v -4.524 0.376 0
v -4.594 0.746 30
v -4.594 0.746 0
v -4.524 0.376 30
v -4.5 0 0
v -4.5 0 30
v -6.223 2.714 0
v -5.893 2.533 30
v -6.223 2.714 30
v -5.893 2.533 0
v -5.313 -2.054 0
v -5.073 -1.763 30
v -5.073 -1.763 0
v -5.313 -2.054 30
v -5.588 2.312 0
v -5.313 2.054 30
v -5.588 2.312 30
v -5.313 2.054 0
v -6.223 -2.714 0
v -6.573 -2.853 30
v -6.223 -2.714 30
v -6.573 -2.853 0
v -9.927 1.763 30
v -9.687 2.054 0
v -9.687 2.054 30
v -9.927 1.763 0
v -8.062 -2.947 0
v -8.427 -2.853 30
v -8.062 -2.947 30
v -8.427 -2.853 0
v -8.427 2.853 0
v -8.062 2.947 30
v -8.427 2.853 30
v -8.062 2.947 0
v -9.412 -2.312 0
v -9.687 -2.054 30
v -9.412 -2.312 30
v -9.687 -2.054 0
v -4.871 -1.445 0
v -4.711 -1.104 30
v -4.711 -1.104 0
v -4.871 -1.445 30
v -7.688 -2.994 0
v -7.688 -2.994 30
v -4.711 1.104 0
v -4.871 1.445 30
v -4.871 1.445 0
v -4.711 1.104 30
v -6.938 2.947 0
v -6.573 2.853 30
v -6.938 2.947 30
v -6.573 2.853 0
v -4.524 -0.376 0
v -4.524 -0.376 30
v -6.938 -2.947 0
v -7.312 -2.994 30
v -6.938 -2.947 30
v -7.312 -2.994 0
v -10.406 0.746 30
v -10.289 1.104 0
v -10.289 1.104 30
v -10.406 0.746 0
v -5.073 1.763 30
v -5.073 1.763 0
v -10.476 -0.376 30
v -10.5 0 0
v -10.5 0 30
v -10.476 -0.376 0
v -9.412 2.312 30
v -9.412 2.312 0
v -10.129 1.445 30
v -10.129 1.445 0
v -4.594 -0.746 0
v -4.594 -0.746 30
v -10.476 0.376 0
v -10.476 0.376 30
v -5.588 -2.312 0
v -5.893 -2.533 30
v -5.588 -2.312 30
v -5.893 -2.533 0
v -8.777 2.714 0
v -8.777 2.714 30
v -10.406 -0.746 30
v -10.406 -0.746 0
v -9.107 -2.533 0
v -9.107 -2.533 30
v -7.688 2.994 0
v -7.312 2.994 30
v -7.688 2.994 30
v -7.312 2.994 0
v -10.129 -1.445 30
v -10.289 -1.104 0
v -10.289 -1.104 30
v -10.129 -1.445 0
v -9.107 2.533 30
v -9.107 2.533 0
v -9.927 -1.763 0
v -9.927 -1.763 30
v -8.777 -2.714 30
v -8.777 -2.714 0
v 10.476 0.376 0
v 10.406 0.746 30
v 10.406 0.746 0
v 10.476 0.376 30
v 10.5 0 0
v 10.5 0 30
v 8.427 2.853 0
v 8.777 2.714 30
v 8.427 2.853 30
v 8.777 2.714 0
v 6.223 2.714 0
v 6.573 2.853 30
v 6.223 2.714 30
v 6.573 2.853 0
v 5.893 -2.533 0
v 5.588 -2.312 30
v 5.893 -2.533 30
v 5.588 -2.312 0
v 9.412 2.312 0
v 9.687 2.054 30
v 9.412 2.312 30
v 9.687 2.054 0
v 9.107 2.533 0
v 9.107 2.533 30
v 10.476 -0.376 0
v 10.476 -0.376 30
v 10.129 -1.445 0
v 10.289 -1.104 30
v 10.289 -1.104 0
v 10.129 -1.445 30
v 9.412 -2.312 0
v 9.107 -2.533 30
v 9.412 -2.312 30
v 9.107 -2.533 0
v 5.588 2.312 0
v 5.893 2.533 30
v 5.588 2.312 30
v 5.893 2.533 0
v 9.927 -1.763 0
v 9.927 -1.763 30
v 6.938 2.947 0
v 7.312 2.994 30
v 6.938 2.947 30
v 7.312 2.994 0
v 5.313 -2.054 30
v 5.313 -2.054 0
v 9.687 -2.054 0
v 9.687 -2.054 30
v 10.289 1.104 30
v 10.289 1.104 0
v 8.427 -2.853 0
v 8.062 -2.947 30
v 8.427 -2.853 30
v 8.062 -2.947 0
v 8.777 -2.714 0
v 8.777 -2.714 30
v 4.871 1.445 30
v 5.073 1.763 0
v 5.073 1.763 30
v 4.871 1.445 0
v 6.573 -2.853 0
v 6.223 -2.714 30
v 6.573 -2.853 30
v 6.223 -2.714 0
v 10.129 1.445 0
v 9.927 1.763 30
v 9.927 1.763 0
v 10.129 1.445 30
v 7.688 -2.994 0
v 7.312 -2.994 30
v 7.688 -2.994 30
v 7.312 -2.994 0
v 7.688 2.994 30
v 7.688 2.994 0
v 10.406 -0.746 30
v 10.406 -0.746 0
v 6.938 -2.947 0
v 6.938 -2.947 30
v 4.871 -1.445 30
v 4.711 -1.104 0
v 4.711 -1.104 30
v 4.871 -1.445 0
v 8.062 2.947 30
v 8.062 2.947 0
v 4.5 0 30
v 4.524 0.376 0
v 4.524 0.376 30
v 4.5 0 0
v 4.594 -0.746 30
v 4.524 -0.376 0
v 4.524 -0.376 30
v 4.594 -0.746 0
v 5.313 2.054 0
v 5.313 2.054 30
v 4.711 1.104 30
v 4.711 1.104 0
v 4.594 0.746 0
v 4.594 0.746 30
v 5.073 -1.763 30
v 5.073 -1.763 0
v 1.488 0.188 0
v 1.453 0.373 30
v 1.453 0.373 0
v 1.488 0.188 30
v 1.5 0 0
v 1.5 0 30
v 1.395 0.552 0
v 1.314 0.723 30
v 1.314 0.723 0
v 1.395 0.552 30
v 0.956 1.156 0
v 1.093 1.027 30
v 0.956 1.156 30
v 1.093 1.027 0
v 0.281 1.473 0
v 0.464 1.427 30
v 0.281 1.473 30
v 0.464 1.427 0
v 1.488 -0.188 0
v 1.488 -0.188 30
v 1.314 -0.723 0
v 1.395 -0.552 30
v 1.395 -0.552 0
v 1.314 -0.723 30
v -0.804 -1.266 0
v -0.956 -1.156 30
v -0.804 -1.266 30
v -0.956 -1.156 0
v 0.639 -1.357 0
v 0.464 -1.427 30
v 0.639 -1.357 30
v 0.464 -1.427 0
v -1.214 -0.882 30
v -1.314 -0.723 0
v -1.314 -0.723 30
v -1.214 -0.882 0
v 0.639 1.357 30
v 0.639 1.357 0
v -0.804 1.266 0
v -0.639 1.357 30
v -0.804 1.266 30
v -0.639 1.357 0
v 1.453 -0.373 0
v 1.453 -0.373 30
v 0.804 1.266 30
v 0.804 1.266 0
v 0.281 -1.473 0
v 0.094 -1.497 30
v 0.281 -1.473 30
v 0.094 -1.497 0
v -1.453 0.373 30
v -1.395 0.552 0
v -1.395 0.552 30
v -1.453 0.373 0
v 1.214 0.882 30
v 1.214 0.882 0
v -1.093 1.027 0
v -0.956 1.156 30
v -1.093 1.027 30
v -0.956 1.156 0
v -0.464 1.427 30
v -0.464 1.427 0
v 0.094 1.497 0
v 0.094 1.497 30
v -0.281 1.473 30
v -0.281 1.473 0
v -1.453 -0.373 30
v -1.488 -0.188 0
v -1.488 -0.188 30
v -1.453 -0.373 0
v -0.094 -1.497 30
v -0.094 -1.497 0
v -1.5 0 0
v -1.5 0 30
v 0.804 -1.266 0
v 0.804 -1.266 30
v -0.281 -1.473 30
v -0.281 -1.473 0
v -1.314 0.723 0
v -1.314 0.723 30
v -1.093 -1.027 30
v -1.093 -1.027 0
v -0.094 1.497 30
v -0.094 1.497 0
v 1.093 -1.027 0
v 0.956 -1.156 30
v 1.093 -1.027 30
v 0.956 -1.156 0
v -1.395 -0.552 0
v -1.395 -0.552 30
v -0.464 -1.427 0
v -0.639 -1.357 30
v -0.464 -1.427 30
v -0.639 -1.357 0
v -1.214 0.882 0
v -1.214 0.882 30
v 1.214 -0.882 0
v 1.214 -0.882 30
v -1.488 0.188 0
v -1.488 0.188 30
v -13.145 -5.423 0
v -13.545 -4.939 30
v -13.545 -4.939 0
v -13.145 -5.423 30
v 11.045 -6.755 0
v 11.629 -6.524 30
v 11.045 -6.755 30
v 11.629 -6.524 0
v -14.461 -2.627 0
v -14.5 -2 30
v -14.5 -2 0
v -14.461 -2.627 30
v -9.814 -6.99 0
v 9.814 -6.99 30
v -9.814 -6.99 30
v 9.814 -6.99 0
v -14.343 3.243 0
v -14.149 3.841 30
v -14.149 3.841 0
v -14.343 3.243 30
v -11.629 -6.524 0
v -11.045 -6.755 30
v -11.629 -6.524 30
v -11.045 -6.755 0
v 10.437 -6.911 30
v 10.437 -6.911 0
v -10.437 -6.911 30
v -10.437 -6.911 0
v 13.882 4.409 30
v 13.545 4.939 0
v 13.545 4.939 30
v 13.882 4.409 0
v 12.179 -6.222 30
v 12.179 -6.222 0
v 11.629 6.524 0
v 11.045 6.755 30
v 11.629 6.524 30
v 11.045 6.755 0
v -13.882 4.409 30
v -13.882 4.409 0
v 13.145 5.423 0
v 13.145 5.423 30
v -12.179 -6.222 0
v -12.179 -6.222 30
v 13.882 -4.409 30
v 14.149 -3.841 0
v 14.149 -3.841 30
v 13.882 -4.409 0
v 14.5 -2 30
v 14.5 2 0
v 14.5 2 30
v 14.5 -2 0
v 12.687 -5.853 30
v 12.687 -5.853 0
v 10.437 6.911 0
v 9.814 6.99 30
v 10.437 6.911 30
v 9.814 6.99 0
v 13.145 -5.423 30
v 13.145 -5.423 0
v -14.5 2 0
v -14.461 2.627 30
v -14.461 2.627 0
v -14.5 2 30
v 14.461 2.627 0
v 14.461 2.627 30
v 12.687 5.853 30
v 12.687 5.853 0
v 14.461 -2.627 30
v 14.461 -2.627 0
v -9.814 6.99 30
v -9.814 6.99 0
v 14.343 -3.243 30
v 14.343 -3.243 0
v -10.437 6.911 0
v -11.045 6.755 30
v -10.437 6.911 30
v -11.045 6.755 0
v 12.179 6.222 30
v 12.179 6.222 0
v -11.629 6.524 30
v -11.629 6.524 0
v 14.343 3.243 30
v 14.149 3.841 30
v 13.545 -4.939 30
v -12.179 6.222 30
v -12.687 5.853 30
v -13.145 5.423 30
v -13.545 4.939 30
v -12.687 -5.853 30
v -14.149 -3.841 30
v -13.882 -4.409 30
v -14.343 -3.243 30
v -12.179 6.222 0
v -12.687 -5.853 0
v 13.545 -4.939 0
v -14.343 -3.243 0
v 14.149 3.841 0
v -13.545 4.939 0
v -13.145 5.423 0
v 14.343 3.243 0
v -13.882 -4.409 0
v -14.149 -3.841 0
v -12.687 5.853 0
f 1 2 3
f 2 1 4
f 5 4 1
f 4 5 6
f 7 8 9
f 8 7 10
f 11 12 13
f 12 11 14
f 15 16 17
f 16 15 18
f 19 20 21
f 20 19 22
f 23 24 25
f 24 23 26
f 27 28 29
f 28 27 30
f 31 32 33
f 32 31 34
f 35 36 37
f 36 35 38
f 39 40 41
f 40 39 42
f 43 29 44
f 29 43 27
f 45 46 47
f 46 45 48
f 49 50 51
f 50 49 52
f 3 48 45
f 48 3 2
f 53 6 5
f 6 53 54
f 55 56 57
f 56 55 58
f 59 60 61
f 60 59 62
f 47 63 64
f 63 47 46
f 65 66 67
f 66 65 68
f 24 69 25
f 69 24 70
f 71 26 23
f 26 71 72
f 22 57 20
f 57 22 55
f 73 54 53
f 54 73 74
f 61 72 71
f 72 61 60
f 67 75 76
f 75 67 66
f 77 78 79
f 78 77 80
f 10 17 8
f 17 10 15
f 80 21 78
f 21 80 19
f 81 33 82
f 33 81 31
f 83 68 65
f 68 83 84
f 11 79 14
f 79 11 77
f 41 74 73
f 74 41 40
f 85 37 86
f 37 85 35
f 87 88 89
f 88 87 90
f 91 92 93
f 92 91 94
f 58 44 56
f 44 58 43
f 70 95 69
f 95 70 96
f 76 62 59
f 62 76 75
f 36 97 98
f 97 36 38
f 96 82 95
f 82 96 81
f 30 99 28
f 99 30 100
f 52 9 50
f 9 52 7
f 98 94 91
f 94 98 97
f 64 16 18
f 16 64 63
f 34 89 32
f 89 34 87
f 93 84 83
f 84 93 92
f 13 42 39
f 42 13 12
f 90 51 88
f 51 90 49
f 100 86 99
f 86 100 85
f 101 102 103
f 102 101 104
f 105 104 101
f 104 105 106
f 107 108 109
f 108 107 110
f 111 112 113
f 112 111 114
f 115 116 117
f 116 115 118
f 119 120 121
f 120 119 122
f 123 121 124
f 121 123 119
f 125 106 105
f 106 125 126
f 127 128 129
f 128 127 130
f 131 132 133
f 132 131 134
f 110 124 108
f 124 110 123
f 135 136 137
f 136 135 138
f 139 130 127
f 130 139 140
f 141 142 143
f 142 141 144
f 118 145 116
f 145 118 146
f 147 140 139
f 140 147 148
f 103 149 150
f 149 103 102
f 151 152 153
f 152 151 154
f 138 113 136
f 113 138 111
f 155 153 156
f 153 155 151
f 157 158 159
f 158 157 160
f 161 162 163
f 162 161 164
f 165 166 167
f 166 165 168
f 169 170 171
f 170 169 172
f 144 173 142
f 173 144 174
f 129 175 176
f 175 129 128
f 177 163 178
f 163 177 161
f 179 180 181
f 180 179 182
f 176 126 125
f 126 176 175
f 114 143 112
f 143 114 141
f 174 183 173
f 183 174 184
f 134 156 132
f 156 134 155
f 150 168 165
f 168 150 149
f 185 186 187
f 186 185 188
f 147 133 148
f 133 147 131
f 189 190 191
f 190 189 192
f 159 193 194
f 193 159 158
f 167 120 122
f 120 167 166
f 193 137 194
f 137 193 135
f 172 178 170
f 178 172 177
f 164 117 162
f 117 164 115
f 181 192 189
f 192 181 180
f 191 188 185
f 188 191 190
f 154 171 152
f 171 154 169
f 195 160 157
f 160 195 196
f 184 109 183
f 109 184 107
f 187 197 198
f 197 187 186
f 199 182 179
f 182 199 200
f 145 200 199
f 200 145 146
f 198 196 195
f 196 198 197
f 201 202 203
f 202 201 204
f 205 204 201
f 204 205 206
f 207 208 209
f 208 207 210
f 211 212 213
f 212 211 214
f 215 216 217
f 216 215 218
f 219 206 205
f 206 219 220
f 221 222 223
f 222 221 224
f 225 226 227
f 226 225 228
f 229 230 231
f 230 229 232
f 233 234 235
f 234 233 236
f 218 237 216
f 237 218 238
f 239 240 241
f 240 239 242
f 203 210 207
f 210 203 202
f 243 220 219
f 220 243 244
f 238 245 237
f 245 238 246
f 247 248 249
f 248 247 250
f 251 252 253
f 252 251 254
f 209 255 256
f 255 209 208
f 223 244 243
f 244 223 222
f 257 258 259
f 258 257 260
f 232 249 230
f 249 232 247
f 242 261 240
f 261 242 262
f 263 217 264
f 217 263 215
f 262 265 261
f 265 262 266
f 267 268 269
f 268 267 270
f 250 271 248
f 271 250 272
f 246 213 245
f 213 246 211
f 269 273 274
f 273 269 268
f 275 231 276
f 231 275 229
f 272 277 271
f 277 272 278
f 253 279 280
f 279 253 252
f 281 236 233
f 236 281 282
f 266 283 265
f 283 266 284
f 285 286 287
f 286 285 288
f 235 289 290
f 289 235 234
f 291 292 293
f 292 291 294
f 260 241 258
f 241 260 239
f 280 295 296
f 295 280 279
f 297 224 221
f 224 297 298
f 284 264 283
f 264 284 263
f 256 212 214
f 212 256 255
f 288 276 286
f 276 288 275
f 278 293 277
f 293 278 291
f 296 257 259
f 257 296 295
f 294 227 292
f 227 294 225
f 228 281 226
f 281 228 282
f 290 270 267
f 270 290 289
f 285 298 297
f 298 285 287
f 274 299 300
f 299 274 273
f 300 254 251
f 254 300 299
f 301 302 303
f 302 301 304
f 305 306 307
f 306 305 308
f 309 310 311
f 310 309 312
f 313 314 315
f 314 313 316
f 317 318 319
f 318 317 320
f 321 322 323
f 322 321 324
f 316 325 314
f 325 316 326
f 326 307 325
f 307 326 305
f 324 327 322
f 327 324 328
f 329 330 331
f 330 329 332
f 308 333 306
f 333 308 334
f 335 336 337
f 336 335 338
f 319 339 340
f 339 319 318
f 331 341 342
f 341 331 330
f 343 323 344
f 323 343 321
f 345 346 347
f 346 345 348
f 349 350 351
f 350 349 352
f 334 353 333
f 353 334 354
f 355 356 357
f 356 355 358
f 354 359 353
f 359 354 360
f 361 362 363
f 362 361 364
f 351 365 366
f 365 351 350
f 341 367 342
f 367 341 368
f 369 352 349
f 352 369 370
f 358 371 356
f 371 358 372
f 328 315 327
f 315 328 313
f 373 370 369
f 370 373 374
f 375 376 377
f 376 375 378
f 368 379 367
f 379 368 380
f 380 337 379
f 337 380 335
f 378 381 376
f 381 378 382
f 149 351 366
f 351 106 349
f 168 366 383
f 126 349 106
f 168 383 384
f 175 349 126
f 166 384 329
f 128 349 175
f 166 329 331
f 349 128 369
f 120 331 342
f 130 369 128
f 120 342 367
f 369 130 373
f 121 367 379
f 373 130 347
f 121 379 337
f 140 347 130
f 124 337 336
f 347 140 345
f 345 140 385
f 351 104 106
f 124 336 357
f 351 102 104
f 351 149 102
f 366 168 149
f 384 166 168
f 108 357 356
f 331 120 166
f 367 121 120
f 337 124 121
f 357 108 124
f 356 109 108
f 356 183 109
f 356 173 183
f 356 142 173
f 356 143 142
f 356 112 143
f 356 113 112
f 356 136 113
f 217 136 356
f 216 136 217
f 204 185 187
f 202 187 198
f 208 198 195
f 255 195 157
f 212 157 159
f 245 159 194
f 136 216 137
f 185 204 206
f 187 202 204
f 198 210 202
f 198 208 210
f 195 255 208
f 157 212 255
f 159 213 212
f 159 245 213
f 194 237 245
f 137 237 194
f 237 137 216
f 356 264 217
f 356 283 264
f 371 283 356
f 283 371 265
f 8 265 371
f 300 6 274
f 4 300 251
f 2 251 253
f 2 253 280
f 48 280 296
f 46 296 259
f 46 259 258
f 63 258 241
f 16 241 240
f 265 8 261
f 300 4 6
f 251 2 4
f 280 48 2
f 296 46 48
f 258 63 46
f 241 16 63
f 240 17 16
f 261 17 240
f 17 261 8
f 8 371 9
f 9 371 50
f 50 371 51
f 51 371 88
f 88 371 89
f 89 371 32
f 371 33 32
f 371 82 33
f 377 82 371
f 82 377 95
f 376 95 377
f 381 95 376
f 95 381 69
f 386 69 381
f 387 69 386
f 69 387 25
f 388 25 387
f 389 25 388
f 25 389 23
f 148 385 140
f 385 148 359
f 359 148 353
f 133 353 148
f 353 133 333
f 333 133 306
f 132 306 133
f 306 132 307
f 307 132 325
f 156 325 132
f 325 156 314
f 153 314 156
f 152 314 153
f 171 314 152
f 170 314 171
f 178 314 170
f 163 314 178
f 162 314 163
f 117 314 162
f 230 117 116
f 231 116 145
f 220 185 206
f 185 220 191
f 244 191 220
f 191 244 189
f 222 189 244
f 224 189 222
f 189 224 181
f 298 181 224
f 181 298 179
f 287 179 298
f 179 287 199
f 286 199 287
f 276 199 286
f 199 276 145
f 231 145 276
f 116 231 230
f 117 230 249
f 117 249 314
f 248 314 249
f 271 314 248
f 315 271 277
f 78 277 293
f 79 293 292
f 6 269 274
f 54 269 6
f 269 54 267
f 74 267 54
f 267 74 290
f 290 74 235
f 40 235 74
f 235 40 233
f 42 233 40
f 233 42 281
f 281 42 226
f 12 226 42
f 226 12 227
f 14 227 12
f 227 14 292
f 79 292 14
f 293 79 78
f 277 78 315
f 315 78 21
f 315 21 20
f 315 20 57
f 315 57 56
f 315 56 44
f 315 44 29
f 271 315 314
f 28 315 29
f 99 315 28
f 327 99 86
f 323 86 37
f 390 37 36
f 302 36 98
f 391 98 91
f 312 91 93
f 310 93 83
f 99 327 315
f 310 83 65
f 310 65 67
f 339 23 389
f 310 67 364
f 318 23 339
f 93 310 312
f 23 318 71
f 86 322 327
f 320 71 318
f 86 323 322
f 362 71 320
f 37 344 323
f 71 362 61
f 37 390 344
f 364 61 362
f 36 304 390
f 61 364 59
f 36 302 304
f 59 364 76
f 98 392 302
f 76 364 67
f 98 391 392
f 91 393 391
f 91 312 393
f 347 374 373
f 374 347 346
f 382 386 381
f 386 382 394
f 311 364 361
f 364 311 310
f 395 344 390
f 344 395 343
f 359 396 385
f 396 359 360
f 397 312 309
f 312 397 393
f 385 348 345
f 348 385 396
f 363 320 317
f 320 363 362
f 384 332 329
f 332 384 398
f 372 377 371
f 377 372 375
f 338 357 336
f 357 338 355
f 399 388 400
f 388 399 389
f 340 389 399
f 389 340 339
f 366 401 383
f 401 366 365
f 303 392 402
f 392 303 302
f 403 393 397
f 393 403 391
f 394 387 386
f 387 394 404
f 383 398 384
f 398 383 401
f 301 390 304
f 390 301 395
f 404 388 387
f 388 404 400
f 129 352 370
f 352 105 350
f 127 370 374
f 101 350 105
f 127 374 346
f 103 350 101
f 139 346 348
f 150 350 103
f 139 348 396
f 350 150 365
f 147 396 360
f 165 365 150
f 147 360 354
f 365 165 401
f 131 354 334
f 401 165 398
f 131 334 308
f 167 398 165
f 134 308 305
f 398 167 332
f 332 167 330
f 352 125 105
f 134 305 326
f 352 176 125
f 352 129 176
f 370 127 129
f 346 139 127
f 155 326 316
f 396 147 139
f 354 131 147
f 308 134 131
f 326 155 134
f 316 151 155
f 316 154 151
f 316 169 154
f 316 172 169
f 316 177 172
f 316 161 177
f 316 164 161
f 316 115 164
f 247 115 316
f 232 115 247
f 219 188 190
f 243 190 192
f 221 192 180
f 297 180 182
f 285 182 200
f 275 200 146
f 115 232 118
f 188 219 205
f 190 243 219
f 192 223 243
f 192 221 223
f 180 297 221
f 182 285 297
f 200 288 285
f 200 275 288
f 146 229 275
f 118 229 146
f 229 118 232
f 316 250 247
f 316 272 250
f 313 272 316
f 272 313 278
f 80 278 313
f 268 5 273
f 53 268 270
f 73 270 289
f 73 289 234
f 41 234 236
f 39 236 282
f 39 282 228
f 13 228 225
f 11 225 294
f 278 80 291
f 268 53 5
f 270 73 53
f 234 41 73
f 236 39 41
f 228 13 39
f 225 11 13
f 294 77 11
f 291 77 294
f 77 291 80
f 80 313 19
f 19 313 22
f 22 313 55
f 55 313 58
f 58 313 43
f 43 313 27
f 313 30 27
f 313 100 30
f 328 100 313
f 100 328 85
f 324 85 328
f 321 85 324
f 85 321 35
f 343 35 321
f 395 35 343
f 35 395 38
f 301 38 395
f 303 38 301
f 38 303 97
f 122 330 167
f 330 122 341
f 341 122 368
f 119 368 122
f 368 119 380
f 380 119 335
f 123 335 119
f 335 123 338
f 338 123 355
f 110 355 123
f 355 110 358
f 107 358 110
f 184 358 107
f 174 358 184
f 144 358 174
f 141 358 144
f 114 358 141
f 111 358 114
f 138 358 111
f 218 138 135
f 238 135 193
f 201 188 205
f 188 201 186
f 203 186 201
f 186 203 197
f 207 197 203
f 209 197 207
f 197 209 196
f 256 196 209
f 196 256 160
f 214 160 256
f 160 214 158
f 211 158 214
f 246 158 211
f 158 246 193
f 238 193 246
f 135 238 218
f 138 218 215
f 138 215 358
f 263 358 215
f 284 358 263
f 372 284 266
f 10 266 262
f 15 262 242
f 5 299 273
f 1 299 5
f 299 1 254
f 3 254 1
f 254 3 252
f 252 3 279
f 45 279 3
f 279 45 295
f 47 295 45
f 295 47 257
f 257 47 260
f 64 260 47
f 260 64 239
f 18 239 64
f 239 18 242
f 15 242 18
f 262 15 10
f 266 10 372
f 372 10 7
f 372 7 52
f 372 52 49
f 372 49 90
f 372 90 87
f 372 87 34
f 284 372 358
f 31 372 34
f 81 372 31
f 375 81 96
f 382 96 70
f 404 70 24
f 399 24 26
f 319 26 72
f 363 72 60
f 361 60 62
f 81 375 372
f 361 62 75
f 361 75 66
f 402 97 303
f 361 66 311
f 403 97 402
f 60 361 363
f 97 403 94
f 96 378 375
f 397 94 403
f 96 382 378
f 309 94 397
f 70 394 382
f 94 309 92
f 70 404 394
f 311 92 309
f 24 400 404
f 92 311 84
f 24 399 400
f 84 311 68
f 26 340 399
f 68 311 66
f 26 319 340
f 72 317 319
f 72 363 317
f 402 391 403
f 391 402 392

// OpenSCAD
$fn = 50;


difference() {
	union() {
		translate(v = [0, 0, 0]) {
			rotate(a = [0, 0, 0]) {
				hull() {
					translate(v = [-9.5000000000, 2.0000000000, 0]) {
						rotate(a = [0, 0, 0]) {
							translate(v = [0, 0, 0]) {
								rotate(a = [0, 0, 0]) {
									cylinder(h = 30, r = 5);
								}
							}
						}
					}
					translate(v = [9.5000000000, 2.0000000000, 0]) {
						rotate(a = [0, 0, 0]) {
							translate(v = [0, 0, 0]) {
								rotate(a = [0, 0, 0]) {
									cylinder(h = 30, r = 5);
								}
							}
						}
					}
					translate(v = [-9.5000000000, -2.0000000000, 0]) {
						rotate(a = [0, 0, 0]) {
							translate(v = [0, 0, 0]) {
								rotate(a = [0, 0, 0]) {
									cylinder(h = 30, r = 5);
								}
							}
						}
					}
					translate(v = [9.5000000000, -2.0000000000, 0]) {
						rotate(a = [0, 0, 0]) {
							translate(v = [0, 0, 0]) {
								rotate(a = [0, 0, 0]) {
									cylinder(h = 30, r = 5);
								}
							}
						}
					}
				}
			}
		}
	}
	union() {
		translate(v = [-7.5000000000, 0.0000000000, 0]) {
			rotate(a = [0, 0, 0]) {
				translate(v = [0, 0, -50]) {
					rotate(a = [0, 0, 0]) {
						cylinder(h = 100, r = 3.0000000000);
					}
				}
			}
		}
		translate(v = [7.5000000000, 0.0000000000, 0]) {
			rotate(a = [0, 0, 0]) {
				translate(v = [0, 0, -50]) {
					rotate(a = [0, 0, 0]) {
						cylinder(h = 100, r = 3.0000000000);
					}
				}
			}
		}
		translate(v = [-7.5000000000, 0.0000000000, 0]) {
			rotate(a = [0, 0, 0]) {
				translate(v = [0, 0, -50]) {
					rotate(a = [0, 0, 0]) {
						cylinder(h = 100, r = 1.5000000000);
					}
				}
			}
		}
		translate(v = [0.0000000000, 0.0000000000, 0]) {
			rotate(a = [0, 0, 0]) {
				translate(v = [0, 0, -50]) {
					rotate(a = [0, 0, 0]) {
						cylinder(h = 100, r = 1.5000000000);
					}
				}
			}
		}
		translate(v = [7.5000000000, 0.0000000000, 0]) {
			rotate(a = [0, 0, 0]) {
				translate(v = [0, 0, -50]) {
					rotate(a = [0, 0, 0]) {
						cylinder(h = 100, r = 1.5000000000);
					}
				}
			}
		}
	}
}
